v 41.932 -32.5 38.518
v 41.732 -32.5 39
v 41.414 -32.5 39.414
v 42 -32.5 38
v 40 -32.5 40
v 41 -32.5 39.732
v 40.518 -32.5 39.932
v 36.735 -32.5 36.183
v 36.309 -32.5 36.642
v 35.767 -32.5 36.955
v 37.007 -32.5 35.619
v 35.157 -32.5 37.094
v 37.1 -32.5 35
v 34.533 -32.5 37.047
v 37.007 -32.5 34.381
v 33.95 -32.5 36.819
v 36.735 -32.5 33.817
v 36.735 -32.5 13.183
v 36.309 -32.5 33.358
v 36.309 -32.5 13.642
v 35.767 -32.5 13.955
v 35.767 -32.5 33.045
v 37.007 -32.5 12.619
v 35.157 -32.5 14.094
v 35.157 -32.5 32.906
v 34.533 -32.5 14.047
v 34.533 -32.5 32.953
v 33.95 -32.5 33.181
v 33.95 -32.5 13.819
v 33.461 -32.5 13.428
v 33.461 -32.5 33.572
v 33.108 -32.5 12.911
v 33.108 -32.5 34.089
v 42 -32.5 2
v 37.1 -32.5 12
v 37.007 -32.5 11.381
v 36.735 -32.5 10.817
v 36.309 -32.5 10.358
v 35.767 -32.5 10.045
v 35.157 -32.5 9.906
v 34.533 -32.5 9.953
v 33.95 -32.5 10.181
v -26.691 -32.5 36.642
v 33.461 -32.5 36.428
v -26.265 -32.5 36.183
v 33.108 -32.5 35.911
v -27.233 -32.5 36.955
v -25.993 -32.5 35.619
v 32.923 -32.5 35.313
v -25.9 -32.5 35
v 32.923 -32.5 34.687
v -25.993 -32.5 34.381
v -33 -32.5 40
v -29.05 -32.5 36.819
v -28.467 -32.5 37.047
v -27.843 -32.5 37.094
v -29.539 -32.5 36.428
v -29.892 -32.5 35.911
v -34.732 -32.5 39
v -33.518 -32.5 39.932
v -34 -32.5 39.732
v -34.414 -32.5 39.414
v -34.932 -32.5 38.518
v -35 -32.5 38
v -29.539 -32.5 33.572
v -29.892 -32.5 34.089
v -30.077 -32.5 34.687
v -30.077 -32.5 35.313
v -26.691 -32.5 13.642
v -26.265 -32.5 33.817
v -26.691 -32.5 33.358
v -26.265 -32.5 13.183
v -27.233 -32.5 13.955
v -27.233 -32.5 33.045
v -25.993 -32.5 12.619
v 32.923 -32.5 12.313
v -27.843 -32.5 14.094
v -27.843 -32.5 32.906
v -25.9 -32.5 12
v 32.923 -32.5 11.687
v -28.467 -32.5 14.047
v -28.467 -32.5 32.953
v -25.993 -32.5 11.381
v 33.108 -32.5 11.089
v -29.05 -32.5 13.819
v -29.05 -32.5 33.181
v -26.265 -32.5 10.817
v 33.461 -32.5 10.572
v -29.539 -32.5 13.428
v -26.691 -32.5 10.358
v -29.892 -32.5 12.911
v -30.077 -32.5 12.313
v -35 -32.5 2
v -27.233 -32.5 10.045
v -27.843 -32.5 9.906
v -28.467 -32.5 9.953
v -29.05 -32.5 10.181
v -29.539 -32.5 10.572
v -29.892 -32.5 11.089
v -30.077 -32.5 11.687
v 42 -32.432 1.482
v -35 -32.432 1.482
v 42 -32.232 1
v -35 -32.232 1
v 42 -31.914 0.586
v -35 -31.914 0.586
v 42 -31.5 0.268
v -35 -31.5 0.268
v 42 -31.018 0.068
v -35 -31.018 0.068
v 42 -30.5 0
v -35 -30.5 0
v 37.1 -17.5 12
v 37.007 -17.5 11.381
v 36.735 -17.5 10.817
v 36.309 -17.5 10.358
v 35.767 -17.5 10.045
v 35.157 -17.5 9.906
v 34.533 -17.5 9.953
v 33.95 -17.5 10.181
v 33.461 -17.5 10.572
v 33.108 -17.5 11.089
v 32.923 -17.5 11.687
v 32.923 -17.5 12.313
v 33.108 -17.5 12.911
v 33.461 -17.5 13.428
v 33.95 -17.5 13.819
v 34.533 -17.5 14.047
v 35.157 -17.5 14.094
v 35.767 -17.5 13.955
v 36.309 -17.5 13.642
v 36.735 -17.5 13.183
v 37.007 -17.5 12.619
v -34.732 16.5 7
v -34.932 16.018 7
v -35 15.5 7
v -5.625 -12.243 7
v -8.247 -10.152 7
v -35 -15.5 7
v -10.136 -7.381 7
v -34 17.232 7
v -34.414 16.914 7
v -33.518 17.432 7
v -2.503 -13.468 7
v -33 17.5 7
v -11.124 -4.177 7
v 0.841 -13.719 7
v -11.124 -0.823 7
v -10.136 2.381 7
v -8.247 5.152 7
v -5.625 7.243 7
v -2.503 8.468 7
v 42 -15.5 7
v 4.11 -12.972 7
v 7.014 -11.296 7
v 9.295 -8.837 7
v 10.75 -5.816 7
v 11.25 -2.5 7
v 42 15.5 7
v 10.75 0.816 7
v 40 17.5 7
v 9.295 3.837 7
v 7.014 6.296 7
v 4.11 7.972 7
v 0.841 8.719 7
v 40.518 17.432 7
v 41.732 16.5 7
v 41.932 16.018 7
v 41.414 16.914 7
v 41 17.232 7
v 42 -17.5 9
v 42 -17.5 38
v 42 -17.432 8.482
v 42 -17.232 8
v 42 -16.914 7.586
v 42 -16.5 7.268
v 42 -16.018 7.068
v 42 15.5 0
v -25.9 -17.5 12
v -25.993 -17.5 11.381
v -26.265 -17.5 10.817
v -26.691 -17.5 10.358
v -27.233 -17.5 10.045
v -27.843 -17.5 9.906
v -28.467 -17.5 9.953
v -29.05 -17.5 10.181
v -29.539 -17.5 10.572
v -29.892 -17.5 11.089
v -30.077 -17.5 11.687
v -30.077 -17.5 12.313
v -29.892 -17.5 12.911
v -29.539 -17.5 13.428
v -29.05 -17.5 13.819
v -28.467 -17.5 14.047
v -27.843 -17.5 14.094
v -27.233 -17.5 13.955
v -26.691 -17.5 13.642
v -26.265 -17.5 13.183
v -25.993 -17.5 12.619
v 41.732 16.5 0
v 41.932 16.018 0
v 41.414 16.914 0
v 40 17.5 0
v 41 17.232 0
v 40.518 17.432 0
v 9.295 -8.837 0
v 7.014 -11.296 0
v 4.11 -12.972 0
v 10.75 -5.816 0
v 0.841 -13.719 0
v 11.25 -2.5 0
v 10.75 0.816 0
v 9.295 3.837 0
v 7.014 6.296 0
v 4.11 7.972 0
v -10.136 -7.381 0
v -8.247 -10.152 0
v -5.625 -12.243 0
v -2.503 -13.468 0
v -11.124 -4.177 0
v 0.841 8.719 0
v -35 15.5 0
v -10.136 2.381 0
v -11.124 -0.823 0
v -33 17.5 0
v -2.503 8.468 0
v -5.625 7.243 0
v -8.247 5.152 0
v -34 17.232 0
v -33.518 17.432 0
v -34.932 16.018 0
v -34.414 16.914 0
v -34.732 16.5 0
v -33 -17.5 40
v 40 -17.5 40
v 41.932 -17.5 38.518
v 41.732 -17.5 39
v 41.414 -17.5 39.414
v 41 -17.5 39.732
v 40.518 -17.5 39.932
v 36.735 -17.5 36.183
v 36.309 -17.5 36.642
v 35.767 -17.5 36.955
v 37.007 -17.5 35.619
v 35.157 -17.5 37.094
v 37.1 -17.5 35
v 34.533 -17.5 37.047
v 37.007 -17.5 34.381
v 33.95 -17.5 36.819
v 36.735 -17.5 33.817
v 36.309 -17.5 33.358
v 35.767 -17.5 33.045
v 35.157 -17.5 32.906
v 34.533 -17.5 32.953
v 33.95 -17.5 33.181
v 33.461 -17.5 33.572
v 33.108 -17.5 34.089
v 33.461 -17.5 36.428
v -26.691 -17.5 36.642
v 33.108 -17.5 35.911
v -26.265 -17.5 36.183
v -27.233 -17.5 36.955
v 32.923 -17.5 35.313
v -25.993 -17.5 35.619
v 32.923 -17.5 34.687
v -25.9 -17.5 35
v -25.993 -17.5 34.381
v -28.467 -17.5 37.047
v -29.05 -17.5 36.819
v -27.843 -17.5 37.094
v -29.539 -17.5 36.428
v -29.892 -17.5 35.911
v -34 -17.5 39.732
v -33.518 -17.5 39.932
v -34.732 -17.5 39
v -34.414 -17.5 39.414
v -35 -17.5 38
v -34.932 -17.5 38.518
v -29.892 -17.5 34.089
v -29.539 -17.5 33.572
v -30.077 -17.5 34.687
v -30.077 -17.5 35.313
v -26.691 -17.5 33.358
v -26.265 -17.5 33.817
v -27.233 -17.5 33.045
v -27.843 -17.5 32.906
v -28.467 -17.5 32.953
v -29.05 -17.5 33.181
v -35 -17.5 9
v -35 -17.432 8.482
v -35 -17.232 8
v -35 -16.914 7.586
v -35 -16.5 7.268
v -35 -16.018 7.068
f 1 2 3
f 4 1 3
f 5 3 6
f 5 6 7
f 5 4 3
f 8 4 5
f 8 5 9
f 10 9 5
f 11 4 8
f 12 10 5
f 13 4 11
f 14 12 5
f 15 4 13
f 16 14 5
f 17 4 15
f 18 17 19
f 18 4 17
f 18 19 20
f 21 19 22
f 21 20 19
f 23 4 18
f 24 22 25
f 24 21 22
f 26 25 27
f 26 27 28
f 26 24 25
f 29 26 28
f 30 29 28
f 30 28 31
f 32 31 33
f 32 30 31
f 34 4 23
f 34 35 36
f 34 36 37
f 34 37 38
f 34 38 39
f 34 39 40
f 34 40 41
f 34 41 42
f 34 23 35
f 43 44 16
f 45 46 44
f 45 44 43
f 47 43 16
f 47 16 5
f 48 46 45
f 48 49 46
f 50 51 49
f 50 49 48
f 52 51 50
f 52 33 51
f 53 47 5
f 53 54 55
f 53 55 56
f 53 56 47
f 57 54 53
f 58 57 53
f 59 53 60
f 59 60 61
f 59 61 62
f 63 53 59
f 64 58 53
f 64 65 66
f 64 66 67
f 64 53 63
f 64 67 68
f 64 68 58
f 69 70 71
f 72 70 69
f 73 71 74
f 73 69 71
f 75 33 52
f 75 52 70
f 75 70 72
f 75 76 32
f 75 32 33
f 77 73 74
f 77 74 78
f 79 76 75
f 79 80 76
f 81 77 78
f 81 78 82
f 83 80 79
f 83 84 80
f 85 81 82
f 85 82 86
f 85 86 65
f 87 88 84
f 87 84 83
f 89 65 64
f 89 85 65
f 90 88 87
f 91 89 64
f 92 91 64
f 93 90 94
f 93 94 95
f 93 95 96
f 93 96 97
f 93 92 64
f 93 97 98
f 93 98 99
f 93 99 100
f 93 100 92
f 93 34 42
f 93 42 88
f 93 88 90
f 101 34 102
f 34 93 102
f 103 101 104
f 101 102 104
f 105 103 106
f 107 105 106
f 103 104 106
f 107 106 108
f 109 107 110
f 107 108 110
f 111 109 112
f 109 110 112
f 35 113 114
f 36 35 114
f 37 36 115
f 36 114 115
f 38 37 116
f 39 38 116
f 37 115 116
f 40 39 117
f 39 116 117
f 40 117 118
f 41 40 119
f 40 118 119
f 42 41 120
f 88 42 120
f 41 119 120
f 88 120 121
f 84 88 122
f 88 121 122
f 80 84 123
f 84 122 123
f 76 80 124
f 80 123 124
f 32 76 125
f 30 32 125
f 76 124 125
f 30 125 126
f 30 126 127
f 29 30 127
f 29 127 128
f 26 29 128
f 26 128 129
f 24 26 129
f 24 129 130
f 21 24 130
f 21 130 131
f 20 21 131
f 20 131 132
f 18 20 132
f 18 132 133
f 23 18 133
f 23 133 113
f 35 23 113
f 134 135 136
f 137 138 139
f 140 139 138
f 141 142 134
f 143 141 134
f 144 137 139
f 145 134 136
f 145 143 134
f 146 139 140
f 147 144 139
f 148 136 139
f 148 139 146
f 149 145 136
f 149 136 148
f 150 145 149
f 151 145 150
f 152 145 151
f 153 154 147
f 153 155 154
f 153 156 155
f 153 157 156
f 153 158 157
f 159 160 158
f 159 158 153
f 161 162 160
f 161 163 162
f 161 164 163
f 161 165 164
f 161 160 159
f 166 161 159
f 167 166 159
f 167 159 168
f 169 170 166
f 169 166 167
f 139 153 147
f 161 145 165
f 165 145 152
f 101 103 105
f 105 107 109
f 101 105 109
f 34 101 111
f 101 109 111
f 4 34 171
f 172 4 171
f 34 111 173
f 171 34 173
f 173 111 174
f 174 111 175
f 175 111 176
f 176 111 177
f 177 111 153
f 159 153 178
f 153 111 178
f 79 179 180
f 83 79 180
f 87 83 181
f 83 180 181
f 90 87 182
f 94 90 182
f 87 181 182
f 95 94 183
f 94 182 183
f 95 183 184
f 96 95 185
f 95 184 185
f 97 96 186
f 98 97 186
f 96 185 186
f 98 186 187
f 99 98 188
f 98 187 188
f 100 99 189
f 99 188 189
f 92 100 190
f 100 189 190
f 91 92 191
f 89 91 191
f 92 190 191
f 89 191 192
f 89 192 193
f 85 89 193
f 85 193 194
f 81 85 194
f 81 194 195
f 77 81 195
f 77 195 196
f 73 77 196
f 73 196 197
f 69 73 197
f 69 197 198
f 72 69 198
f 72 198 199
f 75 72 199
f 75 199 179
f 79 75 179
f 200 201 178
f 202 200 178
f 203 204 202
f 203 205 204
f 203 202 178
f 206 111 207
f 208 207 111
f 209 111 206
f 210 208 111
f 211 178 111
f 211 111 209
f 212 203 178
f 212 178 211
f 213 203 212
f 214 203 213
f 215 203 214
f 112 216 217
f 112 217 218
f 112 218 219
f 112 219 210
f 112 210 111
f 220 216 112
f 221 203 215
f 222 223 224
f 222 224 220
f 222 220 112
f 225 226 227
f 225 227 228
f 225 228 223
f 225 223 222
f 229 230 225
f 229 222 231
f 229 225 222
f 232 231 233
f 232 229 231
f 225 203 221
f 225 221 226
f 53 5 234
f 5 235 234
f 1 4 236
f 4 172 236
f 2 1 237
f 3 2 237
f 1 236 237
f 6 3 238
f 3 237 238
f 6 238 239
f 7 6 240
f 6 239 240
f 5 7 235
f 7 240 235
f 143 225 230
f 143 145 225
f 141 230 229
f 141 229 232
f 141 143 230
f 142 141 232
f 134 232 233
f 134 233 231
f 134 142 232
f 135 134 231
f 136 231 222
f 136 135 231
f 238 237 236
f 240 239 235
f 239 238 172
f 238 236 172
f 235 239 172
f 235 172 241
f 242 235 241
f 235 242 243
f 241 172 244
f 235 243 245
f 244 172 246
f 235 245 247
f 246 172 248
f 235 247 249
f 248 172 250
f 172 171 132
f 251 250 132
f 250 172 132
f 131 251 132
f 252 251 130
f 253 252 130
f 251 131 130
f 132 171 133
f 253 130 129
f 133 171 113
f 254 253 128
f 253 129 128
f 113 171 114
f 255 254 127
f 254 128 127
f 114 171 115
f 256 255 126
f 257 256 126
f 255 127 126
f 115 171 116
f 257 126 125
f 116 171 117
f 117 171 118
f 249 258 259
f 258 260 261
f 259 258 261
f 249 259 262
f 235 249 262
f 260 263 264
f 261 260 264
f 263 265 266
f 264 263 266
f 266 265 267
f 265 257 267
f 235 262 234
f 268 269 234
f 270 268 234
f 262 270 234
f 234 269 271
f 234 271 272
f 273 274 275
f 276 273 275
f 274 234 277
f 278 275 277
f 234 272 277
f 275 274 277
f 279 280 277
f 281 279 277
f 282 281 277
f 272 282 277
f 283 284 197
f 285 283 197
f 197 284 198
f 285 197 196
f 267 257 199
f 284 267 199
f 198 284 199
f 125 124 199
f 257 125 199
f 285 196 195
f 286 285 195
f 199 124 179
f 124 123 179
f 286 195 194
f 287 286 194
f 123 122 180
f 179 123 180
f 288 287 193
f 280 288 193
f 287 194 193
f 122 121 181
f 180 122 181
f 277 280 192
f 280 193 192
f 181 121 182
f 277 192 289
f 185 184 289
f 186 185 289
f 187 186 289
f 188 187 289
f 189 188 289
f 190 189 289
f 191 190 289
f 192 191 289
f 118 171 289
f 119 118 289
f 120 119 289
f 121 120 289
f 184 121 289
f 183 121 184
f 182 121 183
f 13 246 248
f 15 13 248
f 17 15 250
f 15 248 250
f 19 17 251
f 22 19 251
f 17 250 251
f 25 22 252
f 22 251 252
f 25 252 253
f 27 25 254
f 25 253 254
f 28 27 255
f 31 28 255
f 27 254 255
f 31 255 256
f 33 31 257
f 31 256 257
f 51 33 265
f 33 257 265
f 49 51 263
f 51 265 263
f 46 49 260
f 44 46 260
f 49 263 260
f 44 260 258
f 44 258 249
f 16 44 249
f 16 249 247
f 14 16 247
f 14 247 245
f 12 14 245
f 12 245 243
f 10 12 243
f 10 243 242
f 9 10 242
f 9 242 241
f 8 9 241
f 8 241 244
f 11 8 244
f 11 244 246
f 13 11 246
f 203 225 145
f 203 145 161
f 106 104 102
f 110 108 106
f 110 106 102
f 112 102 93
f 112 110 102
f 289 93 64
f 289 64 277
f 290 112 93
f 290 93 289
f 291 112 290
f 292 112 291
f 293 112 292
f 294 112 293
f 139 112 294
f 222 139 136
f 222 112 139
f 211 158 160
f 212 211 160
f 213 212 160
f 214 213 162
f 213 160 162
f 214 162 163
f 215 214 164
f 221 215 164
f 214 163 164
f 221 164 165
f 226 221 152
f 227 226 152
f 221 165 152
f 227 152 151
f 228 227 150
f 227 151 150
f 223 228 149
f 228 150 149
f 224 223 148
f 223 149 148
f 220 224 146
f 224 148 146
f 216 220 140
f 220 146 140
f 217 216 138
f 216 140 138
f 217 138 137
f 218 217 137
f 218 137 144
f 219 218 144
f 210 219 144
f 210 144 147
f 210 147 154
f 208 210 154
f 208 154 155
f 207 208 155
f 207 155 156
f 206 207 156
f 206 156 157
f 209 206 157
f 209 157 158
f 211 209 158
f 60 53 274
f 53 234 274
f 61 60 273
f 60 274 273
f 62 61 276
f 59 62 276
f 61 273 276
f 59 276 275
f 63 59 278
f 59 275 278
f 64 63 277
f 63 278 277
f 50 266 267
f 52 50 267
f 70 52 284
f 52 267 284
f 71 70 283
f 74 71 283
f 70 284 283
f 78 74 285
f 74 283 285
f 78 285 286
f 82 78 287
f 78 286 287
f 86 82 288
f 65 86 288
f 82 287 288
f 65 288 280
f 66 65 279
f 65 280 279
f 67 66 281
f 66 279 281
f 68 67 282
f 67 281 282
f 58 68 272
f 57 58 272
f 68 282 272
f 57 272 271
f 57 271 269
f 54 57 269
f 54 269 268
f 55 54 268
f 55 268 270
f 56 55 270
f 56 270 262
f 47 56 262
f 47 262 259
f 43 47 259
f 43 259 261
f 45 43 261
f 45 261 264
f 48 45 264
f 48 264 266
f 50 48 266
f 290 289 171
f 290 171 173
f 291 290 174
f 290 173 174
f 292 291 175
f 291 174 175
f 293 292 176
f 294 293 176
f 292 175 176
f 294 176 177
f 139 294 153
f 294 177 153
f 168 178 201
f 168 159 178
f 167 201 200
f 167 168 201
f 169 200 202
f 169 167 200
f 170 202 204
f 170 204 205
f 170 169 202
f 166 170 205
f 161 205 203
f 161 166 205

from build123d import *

# Parameters (mm, degrees)
SKETCH1_W           = 77
SKETCH1_H           = 35
BOSS_EXTRUDE1_DEPTH = 7
SKETCH2_R           = 11.25
CUT_EXTRUDE1_DEPTH  = 15
SKETCH3_W           = 77
SKETCH3_H           = 15
BOSS_EXTRUDE2_DEPTH = 40
SKETCH4_R           = 2.1
CUT_EXTRUDE2_DEPTH  = 20
FILLET1_R           = 2
FILLET2_R           = 2


with BuildPart() as part:
    # Sketch1 → Boss-Extrude1 (new body)
    with BuildSketch(Plane.XY):
        with Locations((3.5, 0)):
            Rectangle(SKETCH1_W, SKETCH1_H)
    extrude(amount=BOSS_EXTRUDE1_DEPTH)

    # Sketch2 → Cut-Extrude1 (cut)
    with BuildSketch(Plane.XY.offset(7)):
        with Locations((0, -2.5)):
            Circle(SKETCH2_R)
    extrude(amount=-CUT_EXTRUDE1_DEPTH, mode=Mode.SUBTRACT)

    # Sketch3 → Boss-Extrude2 (add)
    with BuildSketch(Plane(origin=(0, 0, 0), x_dir=(-1, 0, 0), z_dir=(0, 0, -1))):
        with Locations((-3.5, -25)):
            Rectangle(SKETCH3_W, SKETCH3_H)
    extrude(amount=-BOSS_EXTRUDE2_DEPTH)

    # Sketch4 → Cut-Extrude2 (cut)
    with BuildSketch(Plane(origin=(0, -17.5, 0), x_dir=(1, 0, 0), z_dir=(0, 1, 0))):
        with Locations((-28, -35)):
            Circle(SKETCH4_R)
        with Locations((-28, -12)):
            Circle(SKETCH4_R)
        with Locations((35, -35)):
            Circle(SKETCH4_R)
        with Locations((35, -12)):
            Circle(SKETCH4_R)
    extrude(amount=-CUT_EXTRUDE2_DEPTH, mode=Mode.SUBTRACT)

    # Fillet1
    fillet1_edges = [part.edges().sort_by_distance(p)[0] for p in [
        (3.5, -17.5, 7),
    ]]
    fillet(fillet1_edges, radius=FILLET1_R)

    # Fillet2
    fillet2_edges = [part.edges().sort_by_distance(p)[0] for p in [
        (42, -25, 40),
        (-35, -25, 40),
        (3.5, -32.5, 0),
        (-35, 17.5, 3.5),
        (42, 17.5, 3.5),
    ]]
    fillet(fillet2_edges, radius=FILLET2_R)


solid = part.part
